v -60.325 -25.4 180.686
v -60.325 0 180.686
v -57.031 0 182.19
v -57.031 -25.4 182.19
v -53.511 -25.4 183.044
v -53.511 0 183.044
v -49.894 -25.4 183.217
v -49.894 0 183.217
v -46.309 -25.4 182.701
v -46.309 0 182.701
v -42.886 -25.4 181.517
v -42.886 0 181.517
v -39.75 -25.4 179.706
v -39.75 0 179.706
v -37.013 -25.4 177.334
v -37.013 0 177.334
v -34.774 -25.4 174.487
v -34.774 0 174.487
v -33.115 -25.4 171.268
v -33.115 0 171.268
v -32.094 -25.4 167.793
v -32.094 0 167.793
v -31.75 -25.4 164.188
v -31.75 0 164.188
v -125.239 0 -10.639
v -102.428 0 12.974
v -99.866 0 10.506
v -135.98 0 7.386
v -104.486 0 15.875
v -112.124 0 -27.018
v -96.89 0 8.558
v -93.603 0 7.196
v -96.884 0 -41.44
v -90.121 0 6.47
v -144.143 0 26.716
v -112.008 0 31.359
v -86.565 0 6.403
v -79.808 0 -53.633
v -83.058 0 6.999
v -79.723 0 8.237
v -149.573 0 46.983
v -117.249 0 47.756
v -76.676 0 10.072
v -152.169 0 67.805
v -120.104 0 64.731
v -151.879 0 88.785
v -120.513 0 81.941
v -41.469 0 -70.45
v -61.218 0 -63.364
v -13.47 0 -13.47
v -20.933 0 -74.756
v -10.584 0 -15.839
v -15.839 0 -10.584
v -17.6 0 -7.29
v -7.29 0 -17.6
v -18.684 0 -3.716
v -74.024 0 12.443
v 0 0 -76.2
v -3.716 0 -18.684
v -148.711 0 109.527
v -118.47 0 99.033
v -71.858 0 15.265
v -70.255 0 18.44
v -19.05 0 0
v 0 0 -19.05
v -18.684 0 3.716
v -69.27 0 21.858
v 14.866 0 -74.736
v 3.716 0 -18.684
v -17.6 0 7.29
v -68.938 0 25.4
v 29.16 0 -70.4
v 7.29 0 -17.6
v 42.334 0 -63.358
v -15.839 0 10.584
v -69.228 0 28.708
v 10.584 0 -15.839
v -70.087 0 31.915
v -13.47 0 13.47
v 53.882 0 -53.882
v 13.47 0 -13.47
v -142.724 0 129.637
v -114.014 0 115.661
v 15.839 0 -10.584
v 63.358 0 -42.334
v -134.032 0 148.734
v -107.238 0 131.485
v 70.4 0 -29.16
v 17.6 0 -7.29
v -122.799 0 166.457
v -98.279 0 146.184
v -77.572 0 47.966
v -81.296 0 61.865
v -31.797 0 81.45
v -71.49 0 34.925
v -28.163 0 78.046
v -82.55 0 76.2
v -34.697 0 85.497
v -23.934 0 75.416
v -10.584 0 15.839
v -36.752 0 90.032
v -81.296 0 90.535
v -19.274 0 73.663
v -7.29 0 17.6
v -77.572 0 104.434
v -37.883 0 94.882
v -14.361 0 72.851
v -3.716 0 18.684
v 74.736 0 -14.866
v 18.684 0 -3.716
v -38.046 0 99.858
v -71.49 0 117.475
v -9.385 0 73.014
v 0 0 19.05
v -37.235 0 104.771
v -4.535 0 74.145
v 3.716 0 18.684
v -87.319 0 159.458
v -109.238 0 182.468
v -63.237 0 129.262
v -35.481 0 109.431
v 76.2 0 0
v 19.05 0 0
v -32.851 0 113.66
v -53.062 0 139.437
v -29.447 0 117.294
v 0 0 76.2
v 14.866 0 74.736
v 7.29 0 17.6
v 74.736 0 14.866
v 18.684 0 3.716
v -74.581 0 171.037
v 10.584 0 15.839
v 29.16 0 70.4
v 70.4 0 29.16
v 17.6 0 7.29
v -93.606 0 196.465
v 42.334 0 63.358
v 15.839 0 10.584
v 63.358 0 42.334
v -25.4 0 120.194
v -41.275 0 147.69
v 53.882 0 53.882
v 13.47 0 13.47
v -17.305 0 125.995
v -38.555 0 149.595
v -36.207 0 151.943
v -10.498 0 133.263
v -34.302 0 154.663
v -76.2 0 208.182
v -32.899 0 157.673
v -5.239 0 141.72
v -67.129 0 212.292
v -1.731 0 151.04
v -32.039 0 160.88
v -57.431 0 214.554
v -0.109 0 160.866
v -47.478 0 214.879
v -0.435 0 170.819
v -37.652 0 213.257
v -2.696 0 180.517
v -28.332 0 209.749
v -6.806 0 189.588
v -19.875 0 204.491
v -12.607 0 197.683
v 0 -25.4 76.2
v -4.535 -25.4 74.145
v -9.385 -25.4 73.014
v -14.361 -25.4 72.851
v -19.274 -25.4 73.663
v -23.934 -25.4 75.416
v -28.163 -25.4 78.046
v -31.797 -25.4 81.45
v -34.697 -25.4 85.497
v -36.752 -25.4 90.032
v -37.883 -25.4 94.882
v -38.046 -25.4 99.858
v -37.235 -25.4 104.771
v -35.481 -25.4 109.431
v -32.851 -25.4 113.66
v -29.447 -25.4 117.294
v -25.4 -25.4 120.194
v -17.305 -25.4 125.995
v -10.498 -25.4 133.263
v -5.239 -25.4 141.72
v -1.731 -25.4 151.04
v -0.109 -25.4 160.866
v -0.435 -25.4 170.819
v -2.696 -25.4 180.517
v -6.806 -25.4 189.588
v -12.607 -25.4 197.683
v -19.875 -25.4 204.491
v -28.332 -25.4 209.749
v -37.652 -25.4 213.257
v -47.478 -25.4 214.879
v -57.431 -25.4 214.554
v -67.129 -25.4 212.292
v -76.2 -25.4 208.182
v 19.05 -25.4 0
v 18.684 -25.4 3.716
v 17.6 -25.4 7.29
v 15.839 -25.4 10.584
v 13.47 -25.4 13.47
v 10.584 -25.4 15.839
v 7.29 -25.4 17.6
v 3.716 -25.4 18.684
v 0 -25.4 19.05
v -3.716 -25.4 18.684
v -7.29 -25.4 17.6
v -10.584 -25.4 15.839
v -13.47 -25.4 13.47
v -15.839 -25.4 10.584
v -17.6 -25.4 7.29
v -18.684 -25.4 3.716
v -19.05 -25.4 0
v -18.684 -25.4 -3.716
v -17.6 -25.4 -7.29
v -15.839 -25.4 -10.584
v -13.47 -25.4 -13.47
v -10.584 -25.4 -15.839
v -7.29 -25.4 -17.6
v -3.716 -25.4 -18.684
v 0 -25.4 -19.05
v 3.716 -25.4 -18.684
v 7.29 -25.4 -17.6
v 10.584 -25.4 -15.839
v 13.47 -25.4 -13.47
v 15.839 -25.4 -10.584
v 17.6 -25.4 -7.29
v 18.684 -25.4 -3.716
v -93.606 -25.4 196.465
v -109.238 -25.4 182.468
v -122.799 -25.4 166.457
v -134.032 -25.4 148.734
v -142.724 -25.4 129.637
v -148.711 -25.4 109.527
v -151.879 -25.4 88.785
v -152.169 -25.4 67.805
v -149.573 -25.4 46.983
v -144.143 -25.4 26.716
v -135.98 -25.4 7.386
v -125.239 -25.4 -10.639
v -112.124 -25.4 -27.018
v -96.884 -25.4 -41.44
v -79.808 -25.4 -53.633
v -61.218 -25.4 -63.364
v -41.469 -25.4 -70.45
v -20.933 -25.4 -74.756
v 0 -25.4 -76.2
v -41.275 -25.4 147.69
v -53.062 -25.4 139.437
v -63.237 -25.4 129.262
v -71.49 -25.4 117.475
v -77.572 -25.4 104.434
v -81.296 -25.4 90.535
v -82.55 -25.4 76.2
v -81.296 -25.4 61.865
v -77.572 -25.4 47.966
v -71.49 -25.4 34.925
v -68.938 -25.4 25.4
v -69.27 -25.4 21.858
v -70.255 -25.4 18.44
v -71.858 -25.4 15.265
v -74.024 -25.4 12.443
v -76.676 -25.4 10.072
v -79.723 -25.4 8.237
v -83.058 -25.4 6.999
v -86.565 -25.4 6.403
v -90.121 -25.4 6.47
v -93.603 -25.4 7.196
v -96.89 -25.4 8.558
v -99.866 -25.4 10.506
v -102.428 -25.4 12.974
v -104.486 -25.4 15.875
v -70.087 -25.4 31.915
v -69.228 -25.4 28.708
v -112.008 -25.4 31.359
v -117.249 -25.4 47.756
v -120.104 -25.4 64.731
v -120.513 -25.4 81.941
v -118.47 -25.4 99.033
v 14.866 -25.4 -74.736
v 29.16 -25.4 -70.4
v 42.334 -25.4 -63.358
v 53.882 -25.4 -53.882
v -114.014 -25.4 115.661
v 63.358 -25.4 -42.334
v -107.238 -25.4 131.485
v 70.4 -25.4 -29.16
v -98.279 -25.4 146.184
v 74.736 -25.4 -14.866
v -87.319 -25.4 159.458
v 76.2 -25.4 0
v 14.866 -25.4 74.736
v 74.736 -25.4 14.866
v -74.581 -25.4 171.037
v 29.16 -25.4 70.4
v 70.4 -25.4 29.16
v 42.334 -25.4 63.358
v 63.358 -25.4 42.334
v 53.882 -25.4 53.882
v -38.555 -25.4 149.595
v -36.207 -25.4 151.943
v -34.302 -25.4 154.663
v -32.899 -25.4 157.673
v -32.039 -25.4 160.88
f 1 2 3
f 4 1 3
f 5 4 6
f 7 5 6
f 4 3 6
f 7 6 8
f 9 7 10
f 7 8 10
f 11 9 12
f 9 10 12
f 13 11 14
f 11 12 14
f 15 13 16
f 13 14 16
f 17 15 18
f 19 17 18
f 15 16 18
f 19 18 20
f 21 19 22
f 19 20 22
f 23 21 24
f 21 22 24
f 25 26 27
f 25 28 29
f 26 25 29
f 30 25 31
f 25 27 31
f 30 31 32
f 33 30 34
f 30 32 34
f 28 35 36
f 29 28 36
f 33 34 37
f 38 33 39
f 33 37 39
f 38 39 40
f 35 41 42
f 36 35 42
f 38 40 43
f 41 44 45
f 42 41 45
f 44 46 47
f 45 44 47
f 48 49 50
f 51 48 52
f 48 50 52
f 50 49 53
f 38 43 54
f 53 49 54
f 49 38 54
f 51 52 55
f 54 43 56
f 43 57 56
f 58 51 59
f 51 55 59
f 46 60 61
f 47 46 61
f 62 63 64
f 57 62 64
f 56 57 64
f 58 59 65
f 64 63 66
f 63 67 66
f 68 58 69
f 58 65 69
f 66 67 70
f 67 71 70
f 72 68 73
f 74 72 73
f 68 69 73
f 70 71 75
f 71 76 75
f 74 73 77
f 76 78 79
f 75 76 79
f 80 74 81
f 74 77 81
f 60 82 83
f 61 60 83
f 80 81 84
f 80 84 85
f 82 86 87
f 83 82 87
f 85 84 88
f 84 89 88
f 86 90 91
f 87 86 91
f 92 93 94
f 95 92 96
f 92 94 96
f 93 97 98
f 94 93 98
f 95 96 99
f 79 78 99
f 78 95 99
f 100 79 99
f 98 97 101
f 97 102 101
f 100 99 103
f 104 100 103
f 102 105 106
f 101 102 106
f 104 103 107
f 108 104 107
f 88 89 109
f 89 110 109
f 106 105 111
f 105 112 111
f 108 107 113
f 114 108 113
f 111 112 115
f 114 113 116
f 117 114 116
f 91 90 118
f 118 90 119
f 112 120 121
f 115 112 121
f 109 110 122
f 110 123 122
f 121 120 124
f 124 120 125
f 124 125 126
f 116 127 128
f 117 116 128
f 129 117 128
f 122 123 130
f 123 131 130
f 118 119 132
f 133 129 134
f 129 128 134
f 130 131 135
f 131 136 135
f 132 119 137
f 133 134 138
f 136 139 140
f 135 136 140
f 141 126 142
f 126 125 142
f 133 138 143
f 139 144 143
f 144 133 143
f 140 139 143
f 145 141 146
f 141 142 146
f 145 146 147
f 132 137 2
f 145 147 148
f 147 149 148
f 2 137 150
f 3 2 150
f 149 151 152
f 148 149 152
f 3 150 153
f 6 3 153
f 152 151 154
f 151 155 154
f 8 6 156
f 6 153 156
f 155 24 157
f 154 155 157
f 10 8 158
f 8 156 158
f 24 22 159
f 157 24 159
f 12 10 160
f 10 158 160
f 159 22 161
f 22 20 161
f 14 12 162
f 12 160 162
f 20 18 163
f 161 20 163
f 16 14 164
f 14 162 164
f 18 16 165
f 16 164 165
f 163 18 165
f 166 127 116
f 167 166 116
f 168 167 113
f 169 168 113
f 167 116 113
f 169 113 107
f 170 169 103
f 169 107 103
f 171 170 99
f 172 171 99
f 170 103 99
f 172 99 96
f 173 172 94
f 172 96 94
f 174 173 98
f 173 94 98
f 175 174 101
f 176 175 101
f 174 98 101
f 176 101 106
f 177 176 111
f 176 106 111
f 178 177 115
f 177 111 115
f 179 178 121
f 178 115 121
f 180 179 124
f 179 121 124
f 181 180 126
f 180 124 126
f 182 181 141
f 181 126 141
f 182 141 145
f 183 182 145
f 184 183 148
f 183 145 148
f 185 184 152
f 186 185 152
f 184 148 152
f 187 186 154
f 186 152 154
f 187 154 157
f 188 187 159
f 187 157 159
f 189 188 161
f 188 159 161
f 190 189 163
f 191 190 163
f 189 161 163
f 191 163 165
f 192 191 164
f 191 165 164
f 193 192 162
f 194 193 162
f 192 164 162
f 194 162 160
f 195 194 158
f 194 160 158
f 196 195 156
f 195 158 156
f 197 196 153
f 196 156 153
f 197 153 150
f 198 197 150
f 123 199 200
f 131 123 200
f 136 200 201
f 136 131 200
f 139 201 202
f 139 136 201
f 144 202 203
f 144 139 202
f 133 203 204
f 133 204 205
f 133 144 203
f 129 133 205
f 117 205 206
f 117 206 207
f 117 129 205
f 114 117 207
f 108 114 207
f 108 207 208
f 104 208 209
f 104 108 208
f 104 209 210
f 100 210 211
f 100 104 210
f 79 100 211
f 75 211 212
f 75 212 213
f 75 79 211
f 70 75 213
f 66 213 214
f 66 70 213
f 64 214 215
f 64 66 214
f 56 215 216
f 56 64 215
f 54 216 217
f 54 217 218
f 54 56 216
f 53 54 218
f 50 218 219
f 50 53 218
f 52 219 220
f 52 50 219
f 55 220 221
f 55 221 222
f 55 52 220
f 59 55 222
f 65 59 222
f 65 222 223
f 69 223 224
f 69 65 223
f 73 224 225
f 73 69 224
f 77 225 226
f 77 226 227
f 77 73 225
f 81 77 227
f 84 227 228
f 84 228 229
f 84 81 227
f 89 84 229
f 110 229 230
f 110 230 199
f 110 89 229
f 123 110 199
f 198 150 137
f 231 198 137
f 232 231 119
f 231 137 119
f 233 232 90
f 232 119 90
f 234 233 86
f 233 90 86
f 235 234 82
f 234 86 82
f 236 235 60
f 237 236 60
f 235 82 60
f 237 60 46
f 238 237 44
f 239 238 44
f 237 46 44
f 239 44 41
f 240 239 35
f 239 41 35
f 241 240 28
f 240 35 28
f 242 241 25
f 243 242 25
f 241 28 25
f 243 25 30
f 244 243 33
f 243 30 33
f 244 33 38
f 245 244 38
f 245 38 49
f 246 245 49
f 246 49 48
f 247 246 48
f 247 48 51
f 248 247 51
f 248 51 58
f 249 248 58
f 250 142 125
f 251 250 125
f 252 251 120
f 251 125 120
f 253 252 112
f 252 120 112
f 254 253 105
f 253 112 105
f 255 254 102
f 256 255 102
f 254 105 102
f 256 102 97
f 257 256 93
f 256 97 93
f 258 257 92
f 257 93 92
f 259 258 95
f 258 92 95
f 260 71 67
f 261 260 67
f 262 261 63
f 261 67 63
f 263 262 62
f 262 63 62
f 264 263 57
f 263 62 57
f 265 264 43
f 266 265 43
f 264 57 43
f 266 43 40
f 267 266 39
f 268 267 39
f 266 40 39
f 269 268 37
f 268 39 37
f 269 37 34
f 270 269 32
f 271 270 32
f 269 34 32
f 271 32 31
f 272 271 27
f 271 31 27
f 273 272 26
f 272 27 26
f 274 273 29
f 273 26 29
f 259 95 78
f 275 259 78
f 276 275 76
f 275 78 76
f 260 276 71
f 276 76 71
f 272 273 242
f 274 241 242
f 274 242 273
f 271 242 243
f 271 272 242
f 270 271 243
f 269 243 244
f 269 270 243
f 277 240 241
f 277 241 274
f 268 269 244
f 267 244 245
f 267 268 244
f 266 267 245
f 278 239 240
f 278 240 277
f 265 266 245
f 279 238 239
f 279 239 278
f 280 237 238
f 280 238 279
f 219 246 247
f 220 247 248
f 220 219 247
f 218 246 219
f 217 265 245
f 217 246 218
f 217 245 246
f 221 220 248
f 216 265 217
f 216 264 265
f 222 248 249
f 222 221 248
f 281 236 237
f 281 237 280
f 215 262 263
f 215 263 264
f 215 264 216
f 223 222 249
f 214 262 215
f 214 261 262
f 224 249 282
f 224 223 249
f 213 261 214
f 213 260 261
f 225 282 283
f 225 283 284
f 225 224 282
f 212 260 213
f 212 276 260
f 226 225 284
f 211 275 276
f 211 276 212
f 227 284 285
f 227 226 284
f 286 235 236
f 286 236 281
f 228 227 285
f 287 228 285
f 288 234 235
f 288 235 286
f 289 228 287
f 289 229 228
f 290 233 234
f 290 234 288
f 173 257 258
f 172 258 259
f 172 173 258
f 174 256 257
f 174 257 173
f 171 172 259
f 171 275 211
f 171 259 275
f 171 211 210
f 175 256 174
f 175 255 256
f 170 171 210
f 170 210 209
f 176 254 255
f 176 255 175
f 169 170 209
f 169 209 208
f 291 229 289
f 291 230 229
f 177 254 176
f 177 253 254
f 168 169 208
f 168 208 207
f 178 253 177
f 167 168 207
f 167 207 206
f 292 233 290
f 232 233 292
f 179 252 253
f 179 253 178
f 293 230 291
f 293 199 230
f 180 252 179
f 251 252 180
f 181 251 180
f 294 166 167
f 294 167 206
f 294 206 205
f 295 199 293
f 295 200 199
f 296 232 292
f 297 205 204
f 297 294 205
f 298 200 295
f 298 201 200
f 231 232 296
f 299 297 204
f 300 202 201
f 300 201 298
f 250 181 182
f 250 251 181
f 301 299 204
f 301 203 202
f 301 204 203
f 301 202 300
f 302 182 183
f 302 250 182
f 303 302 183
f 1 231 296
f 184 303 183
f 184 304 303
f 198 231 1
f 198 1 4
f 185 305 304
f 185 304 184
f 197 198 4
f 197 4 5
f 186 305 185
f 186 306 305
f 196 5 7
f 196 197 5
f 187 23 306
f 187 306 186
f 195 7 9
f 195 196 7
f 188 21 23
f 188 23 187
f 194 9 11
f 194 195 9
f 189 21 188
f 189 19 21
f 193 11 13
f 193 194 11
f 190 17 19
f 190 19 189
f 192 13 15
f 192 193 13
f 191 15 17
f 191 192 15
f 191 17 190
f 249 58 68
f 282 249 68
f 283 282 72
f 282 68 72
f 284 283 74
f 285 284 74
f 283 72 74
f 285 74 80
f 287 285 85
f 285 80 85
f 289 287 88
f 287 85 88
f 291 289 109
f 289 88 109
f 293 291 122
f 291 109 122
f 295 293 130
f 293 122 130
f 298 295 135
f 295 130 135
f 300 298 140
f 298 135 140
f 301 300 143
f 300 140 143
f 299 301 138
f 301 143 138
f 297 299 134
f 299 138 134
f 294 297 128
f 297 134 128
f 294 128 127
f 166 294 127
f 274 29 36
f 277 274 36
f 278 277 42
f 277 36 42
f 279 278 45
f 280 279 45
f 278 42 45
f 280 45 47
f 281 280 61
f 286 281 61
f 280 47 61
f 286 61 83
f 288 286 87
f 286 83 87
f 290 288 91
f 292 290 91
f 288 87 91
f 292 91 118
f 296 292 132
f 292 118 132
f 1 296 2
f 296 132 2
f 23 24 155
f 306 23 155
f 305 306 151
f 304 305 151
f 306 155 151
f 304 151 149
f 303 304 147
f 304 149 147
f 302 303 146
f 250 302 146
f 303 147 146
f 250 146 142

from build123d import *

# Parameters (mm, degrees)
F0_R     = 19.05
F1_DEPTH = 25.4


with BuildPart() as f1:
    # F0 (on Front) → F1 (new body)
    with BuildSketch(Plane.XZ):
        with BuildLine():
            ThreePointArc((-76.2, 208.182272), (-147.207096, 36.755978), (0, -76.2))
            ThreePointArc((0, -76.2), (76.2, 0), (0, 76.2))
            ThreePointArc((0, 76.2), (-34.697045, 85.497045), (-25.4, 120.194091))
            ThreePointArc((-25.4, 120.194091), (-6.805909, 189.588181), (-76.2, 208.182272))
        make_face()
        Circle(F0_R, mode=Mode.SUBTRACT)
        with BuildLine():
            ThreePointArc((-60.325, 180.685965), (-41.275, 180.685965), (-31.75, 164.188181))
            ThreePointArc((-31.75, 164.188181), (-34.302216, 154.663181), (-41.275, 147.690397))
            ThreePointArc((-41.275, 147.690397), (-79.737177, 97.565512), (-71.490397, 34.925))
            ThreePointArc((-71.490397, 34.925), (-69.587294, 30.330503), (-68.938181, 25.4))
            ThreePointArc((-68.938181, 25.4), (-83.057678, 6.999113), (-104.485965, 15.875))
            ThreePointArc((-104.485965, 15.875), (-116.538951, 107.426518), (-60.325, 180.685965))
        make_face(mode=Mode.SUBTRACT)
    extrude(amount=F1_DEPTH)


solid = f1.part
